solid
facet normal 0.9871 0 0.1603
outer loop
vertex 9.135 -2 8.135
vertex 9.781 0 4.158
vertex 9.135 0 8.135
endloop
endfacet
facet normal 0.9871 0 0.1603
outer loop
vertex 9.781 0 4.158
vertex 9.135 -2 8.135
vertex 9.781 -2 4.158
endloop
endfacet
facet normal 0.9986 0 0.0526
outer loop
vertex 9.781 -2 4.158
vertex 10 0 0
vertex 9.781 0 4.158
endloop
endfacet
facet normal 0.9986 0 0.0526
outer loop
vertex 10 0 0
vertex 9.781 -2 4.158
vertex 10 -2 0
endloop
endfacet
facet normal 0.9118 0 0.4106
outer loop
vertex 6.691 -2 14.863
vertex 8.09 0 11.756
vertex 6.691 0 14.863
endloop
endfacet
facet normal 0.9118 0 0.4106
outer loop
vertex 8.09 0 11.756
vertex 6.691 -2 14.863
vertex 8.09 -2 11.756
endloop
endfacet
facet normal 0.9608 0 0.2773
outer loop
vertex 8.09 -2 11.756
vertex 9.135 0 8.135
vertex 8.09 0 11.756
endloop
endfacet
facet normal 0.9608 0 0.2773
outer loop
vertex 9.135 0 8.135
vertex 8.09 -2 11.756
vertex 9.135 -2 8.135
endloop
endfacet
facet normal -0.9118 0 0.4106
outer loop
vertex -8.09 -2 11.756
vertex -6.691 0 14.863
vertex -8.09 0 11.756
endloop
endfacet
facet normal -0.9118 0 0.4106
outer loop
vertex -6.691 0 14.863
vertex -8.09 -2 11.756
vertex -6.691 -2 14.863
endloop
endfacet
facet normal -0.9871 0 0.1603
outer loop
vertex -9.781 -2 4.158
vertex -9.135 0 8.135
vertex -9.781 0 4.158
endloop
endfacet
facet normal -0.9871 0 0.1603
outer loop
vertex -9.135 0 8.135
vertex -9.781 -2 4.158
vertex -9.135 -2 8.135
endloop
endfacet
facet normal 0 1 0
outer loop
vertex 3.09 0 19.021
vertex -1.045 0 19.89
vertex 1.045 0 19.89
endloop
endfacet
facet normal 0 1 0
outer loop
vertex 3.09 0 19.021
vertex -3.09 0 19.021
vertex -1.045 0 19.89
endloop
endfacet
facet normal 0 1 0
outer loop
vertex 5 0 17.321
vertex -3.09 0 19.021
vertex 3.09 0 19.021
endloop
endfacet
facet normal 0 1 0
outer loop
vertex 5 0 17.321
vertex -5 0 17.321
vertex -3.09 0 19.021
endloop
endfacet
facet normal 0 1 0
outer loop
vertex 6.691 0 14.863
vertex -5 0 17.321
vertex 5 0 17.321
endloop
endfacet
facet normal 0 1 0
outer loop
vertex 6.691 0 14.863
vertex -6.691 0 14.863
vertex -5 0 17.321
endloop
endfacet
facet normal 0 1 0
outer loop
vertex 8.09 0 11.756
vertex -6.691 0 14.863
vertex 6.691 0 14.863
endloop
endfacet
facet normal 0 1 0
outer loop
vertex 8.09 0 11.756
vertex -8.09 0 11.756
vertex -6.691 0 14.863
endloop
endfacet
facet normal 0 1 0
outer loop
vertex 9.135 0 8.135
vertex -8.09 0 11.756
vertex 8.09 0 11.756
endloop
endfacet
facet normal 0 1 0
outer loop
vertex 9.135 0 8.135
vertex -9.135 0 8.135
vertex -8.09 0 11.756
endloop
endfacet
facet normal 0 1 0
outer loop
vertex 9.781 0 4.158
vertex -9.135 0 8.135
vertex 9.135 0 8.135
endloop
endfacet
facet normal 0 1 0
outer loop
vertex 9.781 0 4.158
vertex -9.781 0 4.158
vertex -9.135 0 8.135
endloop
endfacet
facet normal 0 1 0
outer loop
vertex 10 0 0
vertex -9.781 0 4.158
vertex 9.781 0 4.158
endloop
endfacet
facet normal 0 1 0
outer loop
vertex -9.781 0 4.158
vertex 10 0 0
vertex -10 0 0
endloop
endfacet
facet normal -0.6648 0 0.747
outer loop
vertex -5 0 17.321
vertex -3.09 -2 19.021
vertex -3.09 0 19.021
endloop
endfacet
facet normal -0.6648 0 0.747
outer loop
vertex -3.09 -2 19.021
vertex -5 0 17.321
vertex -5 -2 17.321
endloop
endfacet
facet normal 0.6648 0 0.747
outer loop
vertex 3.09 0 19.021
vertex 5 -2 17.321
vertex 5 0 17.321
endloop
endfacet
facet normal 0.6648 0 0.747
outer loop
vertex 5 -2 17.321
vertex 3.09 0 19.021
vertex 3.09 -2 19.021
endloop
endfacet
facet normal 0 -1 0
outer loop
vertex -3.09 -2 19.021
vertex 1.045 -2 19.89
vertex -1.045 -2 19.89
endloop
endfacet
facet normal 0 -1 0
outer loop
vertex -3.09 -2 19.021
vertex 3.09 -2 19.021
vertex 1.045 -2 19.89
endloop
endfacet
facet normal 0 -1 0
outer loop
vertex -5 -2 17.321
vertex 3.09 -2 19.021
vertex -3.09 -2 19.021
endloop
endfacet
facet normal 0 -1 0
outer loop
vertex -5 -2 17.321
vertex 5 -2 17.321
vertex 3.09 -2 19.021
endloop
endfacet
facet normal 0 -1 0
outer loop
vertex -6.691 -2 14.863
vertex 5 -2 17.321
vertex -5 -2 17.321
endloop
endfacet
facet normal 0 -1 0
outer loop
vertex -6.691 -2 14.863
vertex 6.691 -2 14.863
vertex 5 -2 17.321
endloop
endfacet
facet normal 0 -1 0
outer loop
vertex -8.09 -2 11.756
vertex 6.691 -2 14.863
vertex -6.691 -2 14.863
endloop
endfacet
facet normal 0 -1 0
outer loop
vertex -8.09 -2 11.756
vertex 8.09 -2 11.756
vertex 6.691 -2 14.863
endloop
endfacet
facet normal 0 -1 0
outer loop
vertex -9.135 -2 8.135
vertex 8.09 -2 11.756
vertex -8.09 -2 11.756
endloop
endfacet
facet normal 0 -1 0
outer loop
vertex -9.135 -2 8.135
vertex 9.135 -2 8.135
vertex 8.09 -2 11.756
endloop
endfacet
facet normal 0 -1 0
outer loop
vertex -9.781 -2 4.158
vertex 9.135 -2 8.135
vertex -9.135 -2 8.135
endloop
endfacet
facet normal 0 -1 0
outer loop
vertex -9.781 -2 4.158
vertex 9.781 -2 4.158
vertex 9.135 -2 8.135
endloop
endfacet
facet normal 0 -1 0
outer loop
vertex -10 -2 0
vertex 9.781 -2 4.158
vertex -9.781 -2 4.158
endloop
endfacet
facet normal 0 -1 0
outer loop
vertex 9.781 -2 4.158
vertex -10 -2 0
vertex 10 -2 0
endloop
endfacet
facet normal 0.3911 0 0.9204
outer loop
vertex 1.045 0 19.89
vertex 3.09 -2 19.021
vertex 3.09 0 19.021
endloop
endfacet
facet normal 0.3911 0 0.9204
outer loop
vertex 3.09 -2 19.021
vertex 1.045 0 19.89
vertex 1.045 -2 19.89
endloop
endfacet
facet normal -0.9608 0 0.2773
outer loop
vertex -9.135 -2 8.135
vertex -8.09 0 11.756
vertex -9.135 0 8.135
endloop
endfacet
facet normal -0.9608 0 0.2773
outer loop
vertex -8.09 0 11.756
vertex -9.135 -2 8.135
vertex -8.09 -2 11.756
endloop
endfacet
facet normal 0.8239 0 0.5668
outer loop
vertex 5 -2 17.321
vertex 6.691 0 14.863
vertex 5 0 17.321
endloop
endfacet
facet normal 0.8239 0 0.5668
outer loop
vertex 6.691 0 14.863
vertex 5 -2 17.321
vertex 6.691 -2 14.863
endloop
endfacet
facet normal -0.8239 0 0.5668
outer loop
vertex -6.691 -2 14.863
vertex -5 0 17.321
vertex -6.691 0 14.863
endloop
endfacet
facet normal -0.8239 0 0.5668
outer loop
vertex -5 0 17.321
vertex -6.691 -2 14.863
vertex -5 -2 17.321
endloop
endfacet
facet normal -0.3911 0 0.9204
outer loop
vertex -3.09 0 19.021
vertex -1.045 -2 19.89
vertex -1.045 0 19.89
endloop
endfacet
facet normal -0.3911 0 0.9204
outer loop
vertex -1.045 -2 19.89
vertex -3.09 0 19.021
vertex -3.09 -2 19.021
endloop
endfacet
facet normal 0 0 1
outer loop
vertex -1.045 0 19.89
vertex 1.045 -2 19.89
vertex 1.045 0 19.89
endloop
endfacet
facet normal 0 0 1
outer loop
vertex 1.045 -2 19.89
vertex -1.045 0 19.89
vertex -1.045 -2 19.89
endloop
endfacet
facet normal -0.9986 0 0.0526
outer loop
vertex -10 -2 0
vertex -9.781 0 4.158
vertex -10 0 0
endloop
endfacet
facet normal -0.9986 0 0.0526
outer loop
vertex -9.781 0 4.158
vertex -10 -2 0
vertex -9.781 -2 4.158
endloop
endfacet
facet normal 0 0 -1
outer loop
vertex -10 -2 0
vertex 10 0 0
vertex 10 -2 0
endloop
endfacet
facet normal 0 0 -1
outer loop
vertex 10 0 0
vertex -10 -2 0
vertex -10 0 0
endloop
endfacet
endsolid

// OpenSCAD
/*questa funzione restituisce un arco che poi andrà sottratto alla parete di cui fa parte*/


//spessore della parete
spessore = 2;
//altezza dell'arco
altezza = 10;
//più è alto il numero maggiore sarà la deformazione dell'ellisse
scala=2;

base_arco();


module base_arco(){
difference(){
scale([1,1,2])rotate([90,0,0])cylinder(r1=altezza, r2= altezza, h= spessore);
 rotate([90,0,0])translate([-altezza,-2*altezza,0])cube([2*altezza,2*altezza,spessore]); 

}
}
